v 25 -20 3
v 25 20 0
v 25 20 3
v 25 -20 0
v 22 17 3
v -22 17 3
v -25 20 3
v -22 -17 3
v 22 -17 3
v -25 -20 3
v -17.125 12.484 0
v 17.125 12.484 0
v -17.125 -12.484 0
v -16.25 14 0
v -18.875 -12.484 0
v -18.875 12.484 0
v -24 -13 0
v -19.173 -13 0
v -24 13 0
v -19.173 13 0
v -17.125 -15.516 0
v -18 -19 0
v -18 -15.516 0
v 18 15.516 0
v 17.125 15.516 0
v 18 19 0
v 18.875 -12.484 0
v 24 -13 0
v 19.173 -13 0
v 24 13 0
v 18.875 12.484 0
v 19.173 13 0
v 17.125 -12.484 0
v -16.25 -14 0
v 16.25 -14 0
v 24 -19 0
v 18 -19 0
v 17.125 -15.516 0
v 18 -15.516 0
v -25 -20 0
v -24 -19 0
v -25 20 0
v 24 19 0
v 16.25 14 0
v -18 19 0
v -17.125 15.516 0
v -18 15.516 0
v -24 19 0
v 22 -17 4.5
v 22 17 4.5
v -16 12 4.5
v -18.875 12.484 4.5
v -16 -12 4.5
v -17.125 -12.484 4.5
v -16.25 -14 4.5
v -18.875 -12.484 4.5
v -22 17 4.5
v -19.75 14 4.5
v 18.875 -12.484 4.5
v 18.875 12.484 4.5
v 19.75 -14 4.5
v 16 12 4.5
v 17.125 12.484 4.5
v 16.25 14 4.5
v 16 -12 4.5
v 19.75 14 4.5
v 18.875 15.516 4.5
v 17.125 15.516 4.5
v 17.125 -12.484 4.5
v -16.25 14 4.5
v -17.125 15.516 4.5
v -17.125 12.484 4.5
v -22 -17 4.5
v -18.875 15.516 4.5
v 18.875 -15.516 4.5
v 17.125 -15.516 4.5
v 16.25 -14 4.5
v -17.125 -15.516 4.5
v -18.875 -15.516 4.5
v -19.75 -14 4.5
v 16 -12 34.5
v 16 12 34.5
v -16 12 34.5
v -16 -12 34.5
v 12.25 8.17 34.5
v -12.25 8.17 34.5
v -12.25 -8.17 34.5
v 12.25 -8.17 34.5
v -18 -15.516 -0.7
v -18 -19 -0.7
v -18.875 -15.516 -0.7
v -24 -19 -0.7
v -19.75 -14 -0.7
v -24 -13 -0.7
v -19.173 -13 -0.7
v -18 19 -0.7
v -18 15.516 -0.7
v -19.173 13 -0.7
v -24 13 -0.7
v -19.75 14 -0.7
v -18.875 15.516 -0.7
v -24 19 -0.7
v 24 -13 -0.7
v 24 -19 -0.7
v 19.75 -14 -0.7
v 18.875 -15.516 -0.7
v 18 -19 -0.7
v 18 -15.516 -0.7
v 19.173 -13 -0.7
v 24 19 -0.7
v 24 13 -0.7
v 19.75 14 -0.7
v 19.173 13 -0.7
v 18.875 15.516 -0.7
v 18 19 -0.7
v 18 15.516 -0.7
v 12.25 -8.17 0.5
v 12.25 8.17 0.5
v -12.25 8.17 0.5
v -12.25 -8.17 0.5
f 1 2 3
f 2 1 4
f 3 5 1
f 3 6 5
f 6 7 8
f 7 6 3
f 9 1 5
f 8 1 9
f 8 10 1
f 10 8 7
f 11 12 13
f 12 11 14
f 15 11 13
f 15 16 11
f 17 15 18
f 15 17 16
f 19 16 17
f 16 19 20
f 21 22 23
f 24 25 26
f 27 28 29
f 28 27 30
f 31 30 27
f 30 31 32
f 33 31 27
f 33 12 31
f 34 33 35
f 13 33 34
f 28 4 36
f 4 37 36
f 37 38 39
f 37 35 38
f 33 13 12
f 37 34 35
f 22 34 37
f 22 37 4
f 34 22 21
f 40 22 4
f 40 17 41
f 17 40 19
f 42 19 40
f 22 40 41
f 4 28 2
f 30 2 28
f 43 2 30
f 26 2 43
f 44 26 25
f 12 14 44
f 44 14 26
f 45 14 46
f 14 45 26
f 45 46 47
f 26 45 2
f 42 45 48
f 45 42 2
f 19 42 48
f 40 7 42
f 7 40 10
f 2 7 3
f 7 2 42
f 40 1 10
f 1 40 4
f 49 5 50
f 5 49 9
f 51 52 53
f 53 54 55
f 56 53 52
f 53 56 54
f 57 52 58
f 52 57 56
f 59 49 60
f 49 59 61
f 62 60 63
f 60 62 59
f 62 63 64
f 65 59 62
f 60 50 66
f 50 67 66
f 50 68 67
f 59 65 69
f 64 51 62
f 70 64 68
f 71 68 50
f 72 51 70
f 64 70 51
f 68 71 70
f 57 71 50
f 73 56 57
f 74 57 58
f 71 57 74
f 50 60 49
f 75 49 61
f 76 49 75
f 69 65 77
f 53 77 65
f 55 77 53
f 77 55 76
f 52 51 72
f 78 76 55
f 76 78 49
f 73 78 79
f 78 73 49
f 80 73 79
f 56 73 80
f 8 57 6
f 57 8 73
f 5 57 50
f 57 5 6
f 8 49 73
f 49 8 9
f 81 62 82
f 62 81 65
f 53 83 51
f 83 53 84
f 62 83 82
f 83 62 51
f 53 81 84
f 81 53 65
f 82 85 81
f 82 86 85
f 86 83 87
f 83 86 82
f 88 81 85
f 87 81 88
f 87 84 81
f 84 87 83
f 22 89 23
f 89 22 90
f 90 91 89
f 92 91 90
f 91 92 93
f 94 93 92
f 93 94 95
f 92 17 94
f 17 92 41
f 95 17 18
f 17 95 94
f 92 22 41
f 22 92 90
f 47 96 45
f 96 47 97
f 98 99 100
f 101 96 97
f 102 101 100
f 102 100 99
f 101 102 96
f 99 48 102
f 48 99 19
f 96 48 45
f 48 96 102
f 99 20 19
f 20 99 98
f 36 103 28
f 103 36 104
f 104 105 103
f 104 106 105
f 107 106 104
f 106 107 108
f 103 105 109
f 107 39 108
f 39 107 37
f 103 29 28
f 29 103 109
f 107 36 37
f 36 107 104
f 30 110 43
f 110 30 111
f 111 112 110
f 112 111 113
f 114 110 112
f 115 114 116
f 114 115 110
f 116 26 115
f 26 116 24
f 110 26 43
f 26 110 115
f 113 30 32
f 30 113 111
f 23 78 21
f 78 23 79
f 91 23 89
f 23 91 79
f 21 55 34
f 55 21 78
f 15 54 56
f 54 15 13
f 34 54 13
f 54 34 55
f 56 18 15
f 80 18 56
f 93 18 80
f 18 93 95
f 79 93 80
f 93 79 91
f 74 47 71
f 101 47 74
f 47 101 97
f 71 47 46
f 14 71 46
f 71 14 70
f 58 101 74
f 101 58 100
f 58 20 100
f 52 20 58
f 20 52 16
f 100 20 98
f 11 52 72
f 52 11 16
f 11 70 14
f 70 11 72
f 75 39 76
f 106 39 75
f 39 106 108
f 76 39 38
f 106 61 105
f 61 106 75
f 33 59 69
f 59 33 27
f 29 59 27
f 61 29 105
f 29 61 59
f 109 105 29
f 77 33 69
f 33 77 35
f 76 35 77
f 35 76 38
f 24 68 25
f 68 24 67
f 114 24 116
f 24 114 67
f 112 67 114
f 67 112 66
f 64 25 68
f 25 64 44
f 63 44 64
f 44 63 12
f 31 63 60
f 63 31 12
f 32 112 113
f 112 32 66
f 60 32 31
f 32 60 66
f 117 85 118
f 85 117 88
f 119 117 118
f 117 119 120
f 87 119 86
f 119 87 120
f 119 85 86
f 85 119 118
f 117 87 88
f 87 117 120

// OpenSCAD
// Parameters
component_type = 0; //[0:0:1]
orientation = 0; //[0:0:1]
include_spades_or_lugs = 0; //[0:0:1]
overlap = 1; //[0.5:2:0.1]
flange_w = 50; //[25:100:1]
flange_h = 40; //[20:80:1]
flange_t = 3; //[1.5:6:0.5]
bezel_w = 44; //[22:88:1]
bezel_h = 34; //[17:68:1]
bezel_t = 2.5; //[1.5:5:0.5]
body_w = 32; //[16:64:1]
body_h = 24; //[12:48:1]
body_depth_front = 12; //[6:24:1]
rear_body_depth = 18; //[9:36:1]
socket_w = 24.5; //[12.25:49:0.5]
socket_h = 16.34; //[8.17:32.68:0.1]
socket_cut_depth = 40; //[20:80:1]
socket_offset_y = 0; //[-6:6:0.5]
screw_pitch_x = 36; //[18:72:1]
screw_pitch_y = 28; //[14:56:1]
screw_hole_d = 3.5; //[2:7:0.1]

// Corner feature parameters (the "four small blue corner features")
corner_feat_w = 6;
corner_feat_h = 6;
corner_feat_t = 2.5;   // thickness in Z
corner_inset = 1.0;    // keep them slightly inside the flange outline
corner_z_overlap = 1.2; // ensure they intersect the flange/bezel stack

// IEC Connector - complete geometry (single connected solid)
module iec() {

  // Z reference planes (all centered geometry)
  z_flange = flange_t/2;
  z_bezel  = flange_t + bezel_t/2 - overlap;
  z_front  = flange_t + bezel_t + body_depth_front/2 - overlap;
  z_rear   = flange_t + bezel_t + body_depth_front + rear_body_depth/2 - overlap;

  // Place corner features so they physically intersect the flange (and slightly the bezel)
  // Put them near the flange corners in X/Y, and in Z straddling the flange top.
  z_corner = flange_t - corner_feat_t/2 - (corner_z_overlap); // pushes into flange by ~corner_z_overlap

  // Corner positions (near flange corners, inset a bit so they are not outside)
  x_corner = flange_w/2 - corner_feat_w/2 - corner_inset;
  y_corner = flange_h/2 - corner_feat_h/2 - corner_inset;

  // Build solid with cutouts removed
  difference() {
    union() {
      // Main black body (unioned so everything is one connected solid)
      color("Black")
      union() {
        // Flange
        translate([0, 0, z_flange])
          cube([flange_w, flange_h, flange_t], center=true);

        // Bezel (overlaps flange by 'overlap')
        translate([0, 0, z_bezel])
          cube([bezel_w, bezel_h, bezel_t], center=true);

        // Front Body (overlaps bezel by 'overlap')
        translate([0, 0, z_front])
          cube([body_w, body_h, body_depth_front], center=true);

        // Rear Body (overlaps front by 'overlap')
        translate([0, 0, z_rear])
          cube([body_w, body_h, rear_body_depth], center=true);
      }

      // Four small blue corner features - now ATTACHED (overlapping flange by ~1-2mm)
      color("SteelBlue")
      union() {
        for (sx = [-1, 1])
          for (sy = [-1, 1])
            translate([sx*x_corner, sy*y_corner, z_corner])
              cube([corner_feat_w, corner_feat_h, corner_feat_t], center=true);
      }
    }

    // Cutouts (subtract from the union above)
    union() {
      // Socket Opening
      translate([0, socket_offset_y, flange_t + bezel_t + (body_depth_front + rear_body_depth)/2])
        cube([socket_w, socket_h, socket_cut_depth], center=true);

      // Screw Mount Holes
      for (x = [-screw_pitch_x/2, screw_pitch_x/2])
        for (y = [-screw_pitch_y/2, screw_pitch_y/2])
          translate([x, y, (flange_t + bezel_t + body_depth_front + rear_body_depth)/2])
            cylinder(r=screw_hole_d/2,
                     h=flange_t + bezel_t + body_depth_front + rear_body_depth + 2*overlap,
                     center=true);
    }
  }
}

// Assembly
module assembly() {
  iec();
}

assembly();
